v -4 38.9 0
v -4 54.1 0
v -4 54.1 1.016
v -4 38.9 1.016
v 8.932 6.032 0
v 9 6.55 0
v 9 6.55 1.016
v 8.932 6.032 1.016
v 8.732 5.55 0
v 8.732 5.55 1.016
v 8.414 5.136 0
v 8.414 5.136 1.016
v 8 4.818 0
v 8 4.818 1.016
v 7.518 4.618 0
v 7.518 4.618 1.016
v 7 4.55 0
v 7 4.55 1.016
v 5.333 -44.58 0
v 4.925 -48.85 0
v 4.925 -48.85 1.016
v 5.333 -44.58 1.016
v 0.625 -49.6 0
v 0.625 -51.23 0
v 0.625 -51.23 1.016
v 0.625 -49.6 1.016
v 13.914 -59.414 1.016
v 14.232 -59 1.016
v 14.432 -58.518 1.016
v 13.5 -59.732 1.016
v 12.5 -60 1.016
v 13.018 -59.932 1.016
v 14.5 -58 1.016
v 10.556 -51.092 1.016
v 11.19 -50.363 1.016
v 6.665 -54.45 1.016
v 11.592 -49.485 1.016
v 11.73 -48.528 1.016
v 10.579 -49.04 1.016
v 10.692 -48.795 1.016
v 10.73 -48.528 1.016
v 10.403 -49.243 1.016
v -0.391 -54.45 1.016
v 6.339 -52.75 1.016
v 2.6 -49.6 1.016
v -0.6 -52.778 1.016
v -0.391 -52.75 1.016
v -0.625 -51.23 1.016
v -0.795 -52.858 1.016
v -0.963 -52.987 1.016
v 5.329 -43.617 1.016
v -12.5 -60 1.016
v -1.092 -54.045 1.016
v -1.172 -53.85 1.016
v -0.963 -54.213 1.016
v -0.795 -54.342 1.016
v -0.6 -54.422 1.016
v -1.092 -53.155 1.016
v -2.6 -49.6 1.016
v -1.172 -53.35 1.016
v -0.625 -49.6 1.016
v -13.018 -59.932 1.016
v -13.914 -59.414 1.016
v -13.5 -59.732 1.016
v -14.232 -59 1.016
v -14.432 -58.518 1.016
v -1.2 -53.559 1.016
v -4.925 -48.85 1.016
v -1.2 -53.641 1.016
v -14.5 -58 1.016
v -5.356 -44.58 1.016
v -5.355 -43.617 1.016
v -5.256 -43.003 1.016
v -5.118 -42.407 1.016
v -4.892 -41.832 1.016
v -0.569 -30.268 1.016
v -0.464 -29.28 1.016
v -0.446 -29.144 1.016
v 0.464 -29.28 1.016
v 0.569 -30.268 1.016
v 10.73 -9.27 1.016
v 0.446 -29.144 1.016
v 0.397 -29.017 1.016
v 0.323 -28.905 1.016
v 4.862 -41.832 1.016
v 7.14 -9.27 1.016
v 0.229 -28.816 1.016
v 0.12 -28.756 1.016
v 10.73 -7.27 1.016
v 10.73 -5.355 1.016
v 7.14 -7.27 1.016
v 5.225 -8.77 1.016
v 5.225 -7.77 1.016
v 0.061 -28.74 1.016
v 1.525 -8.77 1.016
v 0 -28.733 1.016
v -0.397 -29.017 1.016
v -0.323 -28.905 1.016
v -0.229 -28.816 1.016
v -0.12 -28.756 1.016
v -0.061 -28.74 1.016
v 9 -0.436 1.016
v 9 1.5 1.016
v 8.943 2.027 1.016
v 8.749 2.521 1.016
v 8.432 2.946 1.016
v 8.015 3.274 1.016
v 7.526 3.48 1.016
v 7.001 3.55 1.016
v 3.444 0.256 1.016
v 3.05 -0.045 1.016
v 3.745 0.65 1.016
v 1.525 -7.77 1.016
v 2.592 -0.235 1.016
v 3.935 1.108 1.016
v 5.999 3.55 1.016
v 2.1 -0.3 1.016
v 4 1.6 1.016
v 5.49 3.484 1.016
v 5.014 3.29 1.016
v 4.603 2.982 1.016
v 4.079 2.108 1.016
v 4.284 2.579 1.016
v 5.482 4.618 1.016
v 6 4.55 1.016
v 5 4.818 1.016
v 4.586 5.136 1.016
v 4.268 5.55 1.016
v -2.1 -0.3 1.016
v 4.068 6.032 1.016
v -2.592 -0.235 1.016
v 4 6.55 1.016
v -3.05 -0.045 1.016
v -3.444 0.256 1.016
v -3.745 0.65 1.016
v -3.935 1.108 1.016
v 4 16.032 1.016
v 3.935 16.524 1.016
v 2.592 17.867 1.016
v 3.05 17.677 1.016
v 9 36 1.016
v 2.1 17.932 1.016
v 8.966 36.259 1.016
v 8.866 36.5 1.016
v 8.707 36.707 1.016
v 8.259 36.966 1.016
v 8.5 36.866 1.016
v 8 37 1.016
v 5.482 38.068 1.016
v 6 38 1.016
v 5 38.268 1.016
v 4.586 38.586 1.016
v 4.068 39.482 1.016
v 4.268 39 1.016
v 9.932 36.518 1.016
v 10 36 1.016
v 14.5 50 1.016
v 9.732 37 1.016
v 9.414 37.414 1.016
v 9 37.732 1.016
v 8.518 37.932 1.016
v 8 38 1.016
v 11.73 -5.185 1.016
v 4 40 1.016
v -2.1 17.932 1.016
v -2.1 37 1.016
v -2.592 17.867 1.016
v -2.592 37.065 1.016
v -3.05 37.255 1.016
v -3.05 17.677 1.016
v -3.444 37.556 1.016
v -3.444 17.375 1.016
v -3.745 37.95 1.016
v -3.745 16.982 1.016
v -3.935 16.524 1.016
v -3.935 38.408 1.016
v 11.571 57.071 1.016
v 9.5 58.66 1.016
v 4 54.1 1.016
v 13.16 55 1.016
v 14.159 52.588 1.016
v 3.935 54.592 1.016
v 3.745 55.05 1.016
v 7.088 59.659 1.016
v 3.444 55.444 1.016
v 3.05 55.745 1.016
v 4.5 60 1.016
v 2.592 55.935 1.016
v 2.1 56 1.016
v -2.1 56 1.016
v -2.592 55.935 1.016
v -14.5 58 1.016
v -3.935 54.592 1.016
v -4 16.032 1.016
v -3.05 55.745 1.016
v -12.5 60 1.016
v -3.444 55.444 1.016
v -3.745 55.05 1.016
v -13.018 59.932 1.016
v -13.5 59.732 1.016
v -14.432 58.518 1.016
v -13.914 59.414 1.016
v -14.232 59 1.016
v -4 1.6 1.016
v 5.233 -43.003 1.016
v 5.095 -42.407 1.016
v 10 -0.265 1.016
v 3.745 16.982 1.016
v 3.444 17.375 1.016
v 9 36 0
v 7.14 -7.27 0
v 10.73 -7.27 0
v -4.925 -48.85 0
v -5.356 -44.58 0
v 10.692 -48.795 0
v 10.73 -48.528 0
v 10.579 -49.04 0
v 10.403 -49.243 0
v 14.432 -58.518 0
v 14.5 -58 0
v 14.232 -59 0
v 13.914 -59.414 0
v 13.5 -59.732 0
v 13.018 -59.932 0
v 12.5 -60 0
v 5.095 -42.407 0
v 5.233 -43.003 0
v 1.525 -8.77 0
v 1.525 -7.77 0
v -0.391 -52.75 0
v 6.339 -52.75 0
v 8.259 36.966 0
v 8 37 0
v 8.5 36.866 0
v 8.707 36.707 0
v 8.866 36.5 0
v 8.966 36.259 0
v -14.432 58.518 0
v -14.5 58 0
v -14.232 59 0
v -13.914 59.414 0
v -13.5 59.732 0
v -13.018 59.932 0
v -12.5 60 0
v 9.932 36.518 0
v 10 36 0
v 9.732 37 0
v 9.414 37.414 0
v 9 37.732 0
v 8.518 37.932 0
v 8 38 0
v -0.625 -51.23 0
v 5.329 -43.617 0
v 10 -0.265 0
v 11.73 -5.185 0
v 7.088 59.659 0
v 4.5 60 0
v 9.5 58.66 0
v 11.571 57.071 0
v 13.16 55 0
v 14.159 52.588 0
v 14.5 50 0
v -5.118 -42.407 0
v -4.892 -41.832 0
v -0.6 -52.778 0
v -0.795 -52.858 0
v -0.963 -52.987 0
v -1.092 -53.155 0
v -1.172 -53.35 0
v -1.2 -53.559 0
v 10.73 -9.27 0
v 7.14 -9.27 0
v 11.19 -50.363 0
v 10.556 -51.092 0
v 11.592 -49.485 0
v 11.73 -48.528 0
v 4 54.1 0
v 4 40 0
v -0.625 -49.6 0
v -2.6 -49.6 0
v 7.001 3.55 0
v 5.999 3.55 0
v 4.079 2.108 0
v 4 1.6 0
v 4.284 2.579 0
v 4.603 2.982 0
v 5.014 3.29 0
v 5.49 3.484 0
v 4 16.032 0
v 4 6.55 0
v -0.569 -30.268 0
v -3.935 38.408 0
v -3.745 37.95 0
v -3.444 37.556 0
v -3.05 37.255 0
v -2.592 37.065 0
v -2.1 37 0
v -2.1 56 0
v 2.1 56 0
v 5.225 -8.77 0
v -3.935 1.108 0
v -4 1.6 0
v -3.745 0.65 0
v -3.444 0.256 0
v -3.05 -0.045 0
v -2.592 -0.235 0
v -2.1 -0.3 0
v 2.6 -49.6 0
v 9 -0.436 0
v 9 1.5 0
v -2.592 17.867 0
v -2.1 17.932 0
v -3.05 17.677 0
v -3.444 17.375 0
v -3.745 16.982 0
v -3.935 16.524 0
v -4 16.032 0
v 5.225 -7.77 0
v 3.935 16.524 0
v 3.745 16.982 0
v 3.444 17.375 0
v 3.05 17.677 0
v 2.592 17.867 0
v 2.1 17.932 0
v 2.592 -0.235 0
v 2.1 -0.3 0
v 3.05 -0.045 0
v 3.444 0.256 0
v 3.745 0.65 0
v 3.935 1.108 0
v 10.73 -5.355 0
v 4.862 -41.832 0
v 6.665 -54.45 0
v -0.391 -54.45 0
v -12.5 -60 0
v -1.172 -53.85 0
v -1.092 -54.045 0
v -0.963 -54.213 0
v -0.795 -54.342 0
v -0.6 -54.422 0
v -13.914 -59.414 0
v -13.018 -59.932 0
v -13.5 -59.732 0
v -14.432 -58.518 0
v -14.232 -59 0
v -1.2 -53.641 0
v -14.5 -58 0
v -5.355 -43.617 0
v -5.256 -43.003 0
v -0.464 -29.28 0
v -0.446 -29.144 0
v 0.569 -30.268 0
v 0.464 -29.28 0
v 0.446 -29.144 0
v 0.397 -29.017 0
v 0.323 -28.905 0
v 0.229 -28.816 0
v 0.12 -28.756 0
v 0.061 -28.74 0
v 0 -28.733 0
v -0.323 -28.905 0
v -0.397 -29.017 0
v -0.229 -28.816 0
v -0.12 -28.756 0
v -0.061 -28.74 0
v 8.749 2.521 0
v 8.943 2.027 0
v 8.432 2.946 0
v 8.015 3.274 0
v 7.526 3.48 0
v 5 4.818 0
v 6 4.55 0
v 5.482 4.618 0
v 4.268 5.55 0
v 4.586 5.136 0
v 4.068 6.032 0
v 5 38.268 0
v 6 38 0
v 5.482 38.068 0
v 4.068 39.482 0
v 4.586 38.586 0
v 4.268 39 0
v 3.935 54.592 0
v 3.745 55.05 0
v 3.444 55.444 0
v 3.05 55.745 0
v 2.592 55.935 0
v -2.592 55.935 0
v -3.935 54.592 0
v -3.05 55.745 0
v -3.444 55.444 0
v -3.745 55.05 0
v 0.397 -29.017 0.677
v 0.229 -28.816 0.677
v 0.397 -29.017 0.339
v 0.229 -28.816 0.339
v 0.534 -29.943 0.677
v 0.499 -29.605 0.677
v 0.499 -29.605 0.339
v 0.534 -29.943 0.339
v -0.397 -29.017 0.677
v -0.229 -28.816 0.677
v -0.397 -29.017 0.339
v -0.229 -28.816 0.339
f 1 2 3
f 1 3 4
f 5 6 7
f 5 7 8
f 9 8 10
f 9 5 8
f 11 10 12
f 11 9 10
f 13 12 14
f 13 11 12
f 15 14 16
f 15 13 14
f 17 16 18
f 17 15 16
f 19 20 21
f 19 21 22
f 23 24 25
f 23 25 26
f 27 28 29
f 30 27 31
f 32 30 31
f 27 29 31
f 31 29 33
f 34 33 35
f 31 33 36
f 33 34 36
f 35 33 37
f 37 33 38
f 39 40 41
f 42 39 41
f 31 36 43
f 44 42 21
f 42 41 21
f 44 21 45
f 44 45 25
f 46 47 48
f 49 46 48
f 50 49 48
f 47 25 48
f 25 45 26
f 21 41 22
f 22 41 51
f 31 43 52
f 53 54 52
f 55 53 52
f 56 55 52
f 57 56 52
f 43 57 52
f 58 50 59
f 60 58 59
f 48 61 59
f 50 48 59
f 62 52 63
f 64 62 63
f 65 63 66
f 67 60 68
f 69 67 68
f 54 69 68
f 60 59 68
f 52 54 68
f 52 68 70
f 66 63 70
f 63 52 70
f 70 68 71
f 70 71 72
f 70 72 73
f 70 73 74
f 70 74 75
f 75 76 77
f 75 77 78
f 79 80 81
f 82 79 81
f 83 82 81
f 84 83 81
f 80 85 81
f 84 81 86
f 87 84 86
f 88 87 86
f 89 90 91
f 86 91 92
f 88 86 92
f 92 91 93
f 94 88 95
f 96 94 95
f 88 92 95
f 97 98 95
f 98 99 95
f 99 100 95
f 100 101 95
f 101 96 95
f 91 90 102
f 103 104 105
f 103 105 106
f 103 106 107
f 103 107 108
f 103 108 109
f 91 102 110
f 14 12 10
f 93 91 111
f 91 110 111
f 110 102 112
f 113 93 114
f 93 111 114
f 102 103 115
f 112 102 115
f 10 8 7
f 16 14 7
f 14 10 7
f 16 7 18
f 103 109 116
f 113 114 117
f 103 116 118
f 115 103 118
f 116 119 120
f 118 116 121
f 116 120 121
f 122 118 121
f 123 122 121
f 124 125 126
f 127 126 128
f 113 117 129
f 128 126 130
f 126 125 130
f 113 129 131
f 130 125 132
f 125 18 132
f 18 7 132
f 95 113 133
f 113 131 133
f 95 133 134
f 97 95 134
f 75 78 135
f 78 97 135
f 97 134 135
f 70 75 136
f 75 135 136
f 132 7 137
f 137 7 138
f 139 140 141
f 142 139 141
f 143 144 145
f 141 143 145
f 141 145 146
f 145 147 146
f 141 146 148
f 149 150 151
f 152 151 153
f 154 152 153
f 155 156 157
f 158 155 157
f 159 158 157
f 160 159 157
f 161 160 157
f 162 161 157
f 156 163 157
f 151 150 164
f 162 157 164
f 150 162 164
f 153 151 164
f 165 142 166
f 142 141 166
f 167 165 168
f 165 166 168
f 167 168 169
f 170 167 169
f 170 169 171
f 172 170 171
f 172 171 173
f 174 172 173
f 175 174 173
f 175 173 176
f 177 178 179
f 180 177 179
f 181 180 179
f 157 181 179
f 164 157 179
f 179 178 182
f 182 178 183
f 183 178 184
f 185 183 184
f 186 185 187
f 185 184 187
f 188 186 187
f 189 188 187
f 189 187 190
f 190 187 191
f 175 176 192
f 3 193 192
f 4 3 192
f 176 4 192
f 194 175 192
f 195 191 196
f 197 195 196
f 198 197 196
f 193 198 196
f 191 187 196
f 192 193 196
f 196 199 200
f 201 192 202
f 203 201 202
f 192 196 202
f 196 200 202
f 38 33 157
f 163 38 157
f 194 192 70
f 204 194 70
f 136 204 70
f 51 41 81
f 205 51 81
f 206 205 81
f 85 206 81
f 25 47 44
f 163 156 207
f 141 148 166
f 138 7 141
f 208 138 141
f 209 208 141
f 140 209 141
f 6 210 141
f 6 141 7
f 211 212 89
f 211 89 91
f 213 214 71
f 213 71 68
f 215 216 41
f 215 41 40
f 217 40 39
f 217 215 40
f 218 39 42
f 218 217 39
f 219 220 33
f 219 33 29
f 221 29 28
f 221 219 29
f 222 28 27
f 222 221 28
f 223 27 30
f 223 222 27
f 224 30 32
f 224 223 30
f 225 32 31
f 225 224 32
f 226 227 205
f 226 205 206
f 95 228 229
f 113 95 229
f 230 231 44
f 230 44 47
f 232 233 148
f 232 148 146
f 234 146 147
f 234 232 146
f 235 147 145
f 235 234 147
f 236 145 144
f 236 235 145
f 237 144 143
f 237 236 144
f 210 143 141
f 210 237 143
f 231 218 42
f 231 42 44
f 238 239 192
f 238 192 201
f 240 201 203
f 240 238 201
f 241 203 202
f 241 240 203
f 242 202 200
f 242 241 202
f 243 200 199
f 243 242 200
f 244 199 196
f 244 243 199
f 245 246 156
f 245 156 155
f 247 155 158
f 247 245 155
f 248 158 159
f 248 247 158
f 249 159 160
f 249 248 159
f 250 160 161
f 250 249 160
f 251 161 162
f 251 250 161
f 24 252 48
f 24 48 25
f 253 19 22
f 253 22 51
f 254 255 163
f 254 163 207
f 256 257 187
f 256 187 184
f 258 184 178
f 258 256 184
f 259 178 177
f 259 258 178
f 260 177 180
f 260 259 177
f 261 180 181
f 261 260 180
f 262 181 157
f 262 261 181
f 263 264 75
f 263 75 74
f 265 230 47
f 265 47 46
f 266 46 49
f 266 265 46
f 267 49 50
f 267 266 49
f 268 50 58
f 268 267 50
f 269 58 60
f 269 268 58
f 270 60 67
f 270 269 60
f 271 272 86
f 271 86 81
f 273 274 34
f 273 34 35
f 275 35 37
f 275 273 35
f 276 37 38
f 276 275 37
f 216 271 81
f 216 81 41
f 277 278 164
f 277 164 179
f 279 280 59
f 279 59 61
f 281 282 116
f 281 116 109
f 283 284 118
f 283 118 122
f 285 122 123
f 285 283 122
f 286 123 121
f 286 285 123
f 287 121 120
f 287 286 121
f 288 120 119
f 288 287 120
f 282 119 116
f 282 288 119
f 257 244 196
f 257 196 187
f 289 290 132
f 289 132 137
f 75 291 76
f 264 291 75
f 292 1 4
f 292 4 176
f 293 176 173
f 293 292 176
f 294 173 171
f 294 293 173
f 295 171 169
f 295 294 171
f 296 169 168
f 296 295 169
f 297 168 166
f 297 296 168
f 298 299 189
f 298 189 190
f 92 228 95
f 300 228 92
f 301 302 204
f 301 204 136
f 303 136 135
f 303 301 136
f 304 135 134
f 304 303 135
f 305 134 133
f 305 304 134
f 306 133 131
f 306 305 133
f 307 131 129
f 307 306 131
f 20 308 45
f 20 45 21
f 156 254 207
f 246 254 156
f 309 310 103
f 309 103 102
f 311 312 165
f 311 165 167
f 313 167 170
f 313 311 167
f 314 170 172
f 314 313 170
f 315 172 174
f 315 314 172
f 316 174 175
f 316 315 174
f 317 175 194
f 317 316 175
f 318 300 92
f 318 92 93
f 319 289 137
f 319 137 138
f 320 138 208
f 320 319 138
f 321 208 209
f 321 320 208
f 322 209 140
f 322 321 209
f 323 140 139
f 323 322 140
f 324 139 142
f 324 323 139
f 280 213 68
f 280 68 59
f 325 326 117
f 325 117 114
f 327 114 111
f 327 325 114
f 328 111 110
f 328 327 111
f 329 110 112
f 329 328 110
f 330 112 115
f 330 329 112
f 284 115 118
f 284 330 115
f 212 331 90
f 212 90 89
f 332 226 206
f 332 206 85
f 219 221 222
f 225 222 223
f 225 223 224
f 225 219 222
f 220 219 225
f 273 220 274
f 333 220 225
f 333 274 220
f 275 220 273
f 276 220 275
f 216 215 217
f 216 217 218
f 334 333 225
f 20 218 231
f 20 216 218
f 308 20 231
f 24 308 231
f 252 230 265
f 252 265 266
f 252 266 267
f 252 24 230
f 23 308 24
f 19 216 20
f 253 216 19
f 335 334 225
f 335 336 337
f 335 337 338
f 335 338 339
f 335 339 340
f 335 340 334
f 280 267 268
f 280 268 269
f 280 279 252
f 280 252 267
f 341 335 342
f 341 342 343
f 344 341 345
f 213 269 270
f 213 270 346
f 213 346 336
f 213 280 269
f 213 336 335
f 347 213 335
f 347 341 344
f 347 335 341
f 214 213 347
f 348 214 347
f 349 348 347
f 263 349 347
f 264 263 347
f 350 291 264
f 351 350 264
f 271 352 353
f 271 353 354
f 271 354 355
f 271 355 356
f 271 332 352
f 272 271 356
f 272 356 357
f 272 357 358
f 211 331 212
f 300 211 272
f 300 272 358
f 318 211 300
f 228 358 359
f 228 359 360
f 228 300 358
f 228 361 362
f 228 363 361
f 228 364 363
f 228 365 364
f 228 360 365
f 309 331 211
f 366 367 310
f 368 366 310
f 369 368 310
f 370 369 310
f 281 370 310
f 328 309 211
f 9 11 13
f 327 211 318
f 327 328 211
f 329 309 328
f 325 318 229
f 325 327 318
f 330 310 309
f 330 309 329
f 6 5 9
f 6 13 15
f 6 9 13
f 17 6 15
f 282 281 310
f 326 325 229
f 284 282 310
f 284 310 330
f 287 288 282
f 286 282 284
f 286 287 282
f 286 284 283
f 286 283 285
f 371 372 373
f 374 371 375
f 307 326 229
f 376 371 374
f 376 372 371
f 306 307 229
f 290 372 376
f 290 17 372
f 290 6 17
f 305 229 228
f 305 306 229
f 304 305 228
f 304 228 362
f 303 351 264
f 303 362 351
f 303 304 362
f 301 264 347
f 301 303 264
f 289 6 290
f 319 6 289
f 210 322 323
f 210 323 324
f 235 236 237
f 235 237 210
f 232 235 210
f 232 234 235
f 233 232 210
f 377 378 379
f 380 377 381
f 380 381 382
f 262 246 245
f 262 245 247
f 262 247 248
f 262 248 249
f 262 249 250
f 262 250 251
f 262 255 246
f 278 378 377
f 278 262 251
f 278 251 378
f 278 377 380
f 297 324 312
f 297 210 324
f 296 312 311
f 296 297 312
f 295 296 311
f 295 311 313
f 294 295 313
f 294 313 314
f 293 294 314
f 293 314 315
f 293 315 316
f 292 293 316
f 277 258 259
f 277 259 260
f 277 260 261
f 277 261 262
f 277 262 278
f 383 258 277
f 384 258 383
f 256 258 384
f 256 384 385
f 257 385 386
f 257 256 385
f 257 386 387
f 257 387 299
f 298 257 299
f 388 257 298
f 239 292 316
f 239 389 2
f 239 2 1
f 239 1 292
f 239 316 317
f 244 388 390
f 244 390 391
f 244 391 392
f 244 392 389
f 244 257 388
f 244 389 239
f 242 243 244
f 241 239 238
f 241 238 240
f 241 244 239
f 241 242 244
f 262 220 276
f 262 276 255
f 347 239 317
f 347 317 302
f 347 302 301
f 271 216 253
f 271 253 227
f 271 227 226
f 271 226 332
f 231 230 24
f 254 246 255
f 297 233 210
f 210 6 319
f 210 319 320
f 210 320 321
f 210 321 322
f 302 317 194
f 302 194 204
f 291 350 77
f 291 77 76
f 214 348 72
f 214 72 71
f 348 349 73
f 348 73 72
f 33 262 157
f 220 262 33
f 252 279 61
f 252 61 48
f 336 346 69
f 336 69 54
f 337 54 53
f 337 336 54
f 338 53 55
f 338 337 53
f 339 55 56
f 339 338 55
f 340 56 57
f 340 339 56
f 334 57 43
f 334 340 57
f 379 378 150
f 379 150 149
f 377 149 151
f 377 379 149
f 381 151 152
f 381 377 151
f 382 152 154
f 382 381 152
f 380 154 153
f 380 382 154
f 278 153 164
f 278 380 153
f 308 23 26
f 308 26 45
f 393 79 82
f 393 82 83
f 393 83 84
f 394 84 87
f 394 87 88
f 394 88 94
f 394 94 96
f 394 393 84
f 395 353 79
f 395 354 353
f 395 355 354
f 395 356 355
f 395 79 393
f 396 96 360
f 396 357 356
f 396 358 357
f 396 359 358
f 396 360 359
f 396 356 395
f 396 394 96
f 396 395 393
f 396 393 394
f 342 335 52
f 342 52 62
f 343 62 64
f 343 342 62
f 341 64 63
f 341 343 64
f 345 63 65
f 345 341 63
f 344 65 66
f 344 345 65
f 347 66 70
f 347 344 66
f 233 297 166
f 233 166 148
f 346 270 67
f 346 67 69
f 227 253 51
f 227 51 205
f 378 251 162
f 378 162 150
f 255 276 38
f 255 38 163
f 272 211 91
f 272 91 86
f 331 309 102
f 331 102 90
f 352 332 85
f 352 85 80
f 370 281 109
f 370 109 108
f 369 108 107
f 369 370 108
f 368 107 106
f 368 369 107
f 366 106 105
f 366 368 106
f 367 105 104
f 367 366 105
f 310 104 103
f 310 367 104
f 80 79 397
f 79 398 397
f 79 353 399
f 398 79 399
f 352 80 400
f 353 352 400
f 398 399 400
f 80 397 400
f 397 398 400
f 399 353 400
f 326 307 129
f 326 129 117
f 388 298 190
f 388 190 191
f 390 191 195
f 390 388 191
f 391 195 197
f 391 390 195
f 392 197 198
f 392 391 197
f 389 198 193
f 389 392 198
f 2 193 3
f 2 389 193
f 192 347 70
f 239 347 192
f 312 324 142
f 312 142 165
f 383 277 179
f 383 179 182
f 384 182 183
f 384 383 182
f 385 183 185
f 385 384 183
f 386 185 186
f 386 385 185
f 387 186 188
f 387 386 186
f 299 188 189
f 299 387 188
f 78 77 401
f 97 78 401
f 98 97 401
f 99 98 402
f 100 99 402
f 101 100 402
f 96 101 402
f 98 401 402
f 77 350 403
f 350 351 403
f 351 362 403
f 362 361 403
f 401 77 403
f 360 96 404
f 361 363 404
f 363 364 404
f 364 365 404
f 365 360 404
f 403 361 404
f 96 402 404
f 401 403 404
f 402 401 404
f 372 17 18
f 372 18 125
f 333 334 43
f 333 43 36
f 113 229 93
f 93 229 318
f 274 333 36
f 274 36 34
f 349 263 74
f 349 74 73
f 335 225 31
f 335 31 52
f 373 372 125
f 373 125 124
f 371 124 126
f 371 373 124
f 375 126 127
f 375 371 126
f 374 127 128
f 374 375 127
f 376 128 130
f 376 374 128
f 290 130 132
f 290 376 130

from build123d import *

# Parameters (mm, degrees)
BOSS_EXTRUDE4_DEPTH    = 1.016
CUT_EXTRUDE2_OUTLINE_W = 3.7
CUT_EXTRUDE2_OUTLINE_H = 1
CUT_EXTRUDE2_DEPTH     = 1.016


with BuildPart() as part:
    # Sketch6 → Boss-Extrude4 (new body)
    with BuildSketch(Plane.XY):
        with BuildLine():
            Line((-12.5, 60), (4.5, 60))
            ThreePointArc((4.5, 60), (11.571067812, 57.071067812), (14.5, 50))
            Line((14.5, 50), (14.5, -58))
            ThreePointArc((14.5, -58), (13.914213562, -59.414213562), (12.5, -60))
            Line((12.5, -60), (-12.5, -60))
            ThreePointArc((-12.5, -60), (-13.914213562, -59.414213562), (-14.5, -58))
            Line((-14.5, -58), (-14.5, 58))
            ThreePointArc((-14.5, 58), (-13.914213562, 59.414213562), (-12.5, 60))
        make_face()
    extrude(amount=BOSS_EXTRUDE4_DEPTH)

    # Cut-Extrude2: read off the stored shape, not the designer's step
    # Cut-Extrude2 outline → Cut-Extrude2 (cut)
    with BuildSketch(Plane.XY):
        with BuildLine():
            add(Edge.make_bspline(
                [(0.464136716, -29.280008599), (0.50069296, -29.588797386), (0.532256612, -29.958993284), (0.568812856, -30.267782071)],
                knots=[2, 2, 2, 2, 3, 3, 3, 3], degree=3))
            add(Edge.make_bspline(
                [(0.464136716, -29.280008599), (0.460815442, -29.004347325), (0.24608723, -28.738291079), (4.711e-06, -28.733078818)],
                knots=[25.000001953, 25.000001953, 25.000001953, 25.000001953, 25.984659899, 25.984659899, 25.984659899, 25.984659899], degree=3))
            add(Edge.make_bspline(
                [(-0.464136716, -29.280008613), (-0.460815442, -29.004347325), (-0.24608723, -28.738291079), (4.711e-06, -28.733078818)],
                knots=[25.000001953, 25.000001953, 25.000001953, 25.000001953, 25.984659899, 25.984659899, 25.984659899, 25.984659899], degree=3))
            Line((-0.464136716, -29.280008613), (-0.568812856, -30.267782071))
            Line((-0.568812856, -30.267782071), (-4.892180174, -41.831826427))
            Line((-4.892180174, -41.831826427), (-5.117963119, -42.406855927))
            Line((-5.117963119, -42.406855927), (-5.25555162, -43.003051232))
            Line((-5.25555162, -43.003051232), (-5.354849178, -43.616881121))
            Line((-5.354849178, -43.616881121), (-5.355849178, -44.579979095))
            Line((-5.355849178, -44.579979095), (-4.925, -48.85))
            Line((-4.925, -48.85), (-2.6, -49.6))
            Line((-2.6, -49.6), (-0.625, -49.6))
            Line((-0.625, -49.6), (-0.625, -51.23))
            Line((-0.625, -51.23), (0.625, -51.23))
            Line((0.625, -51.23), (0.625, -49.6))
            Line((0.625, -49.6), (2.6, -49.6))
            Line((2.6, -49.6), (4.925, -48.85))
            Line((4.925, -48.85), (5.332817408, -44.579979095))
            Line((5.332817408, -44.579979095), (5.328817408, -43.616881121))
            Line((5.328817408, -43.616881121), (5.232524742, -43.003051232))
            Line((5.232524742, -43.003051232), (5.094957773, -42.406855927))
            Line((5.094957773, -42.406855927), (4.862112382, -41.831826427))
            Line((4.862112382, -41.831826427), (0.568812856, -30.267782071))
        make_face()
        with BuildLine():
            ThreePointArc((4, 16.031829774), (3.443502884, 17.375332658), (2.1, 17.931829774))
            Line((2.1, 17.931829774), (-2.1, 17.931829774))
            ThreePointArc((-2.1, 17.931829774), (-3.443502884, 17.375332658), (-4, 16.031829774))
            Line((-4, 16.031829774), (-4, 1.6))
            ThreePointArc((-4, 1.6), (-3.443502884, 0.256497116), (-2.1, -0.3))
            Line((-2.1, -0.3), (2.1, -0.3))
            ThreePointArc((2.1, -0.3), (3.443502884, 0.256497116), (4, 1.6))
            ThreePointArc((4, 1.6), (4.602950898, 2.981782106), (5.999374902, 3.55))
            Line((5.999374902, 3.55), (7.000625098, 3.55))
            ThreePointArc((7.000625098, 3.55), (8.432407204, 2.946424004), (9, 1.5))
            Line((9, 1.5), (9, -0.435932815))
            Line((9, -0.435932815), (10.73, -5.355496174))
            Line((10.73, -5.355496174), (10.73, -7.27))
            Line((10.73, -7.27), (7.140268475, -7.27))
            Line((7.140268475, -7.27), (7.140268475, -9.27))
            Line((7.140268475, -9.27), (10.73, -9.27))
            Line((10.73, -9.27), (10.73, -48.528487843))
            ThreePointArc((10.73, -48.528487843), (10.644281066, -48.921574831), (10.402688829, -49.243286359))
            Line((10.402688829, -49.243286359), (6.339155629, -52.75))
            Line((6.339155629, -52.75), (-0.390660403, -52.75))
            ThreePointArc((-0.390660403, -52.75), (-0.96294992, -52.98705008), (-1.2, -53.559339597))
            Line((-1.2, -53.559339597), (-1.2, -53.640660403))
            ThreePointArc((-1.2, -53.640660403), (-0.96294992, -54.21294992), (-0.390660403, -54.45))
            Line((-0.390660403, -54.45), (6.665142853, -54.45))
            Line((6.665142853, -54.45), (10.556020375, -51.092283301))
            ThreePointArc((10.556020375, -51.092283301), (11.422548586, -49.938388133), (11.73, -48.528487843))
            Line((11.73, -48.528487843), (11.73, -5.184791238))
            Line((11.73, -5.184791238), (10, -0.265227879))
            Line((10, -0.265227879), (10, 36))
            ThreePointArc((10, 36), (9.414213562, 37.414213562), (8, 38))
            Line((8, 38), (6, 38))
            ThreePointArc((6, 38), (4.585786438, 38.585786438), (4, 40))
            Line((4, 40), (4, 54.1))
            ThreePointArc((4, 54.1), (3.443502884, 55.443502884), (2.1, 56))
            Line((2.1, 56), (-2.1, 56))
            ThreePointArc((-2.1, 56), (-3.443502884, 55.443502884), (-4, 54.1))
            Line((-4, 54.1), (-4, 38.9))
            ThreePointArc((-4, 38.9), (-3.443502884, 37.556497116), (-2.1, 37))
            Line((-2.1, 37), (8, 37))
            ThreePointArc((8, 37), (8.707106781, 36.707106781), (9, 36))
            Line((9, 36), (9, 6.55))
            ThreePointArc((9, 6.55), (8.414213562, 5.135786438), (7, 4.55))
            Line((7, 4.55), (6, 4.55))
            ThreePointArc((6, 4.55), (4.585786438, 5.135786438), (4, 6.55))
            Line((4, 6.55), (4, 16.031829774))
        make_face()
        with Locations((3.375465258, -8.27)):
            Rectangle(CUT_EXTRUDE2_OUTLINE_W, CUT_EXTRUDE2_OUTLINE_H)
    extrude(amount=CUT_EXTRUDE2_DEPTH, mode=Mode.SUBTRACT)


solid = part.part
